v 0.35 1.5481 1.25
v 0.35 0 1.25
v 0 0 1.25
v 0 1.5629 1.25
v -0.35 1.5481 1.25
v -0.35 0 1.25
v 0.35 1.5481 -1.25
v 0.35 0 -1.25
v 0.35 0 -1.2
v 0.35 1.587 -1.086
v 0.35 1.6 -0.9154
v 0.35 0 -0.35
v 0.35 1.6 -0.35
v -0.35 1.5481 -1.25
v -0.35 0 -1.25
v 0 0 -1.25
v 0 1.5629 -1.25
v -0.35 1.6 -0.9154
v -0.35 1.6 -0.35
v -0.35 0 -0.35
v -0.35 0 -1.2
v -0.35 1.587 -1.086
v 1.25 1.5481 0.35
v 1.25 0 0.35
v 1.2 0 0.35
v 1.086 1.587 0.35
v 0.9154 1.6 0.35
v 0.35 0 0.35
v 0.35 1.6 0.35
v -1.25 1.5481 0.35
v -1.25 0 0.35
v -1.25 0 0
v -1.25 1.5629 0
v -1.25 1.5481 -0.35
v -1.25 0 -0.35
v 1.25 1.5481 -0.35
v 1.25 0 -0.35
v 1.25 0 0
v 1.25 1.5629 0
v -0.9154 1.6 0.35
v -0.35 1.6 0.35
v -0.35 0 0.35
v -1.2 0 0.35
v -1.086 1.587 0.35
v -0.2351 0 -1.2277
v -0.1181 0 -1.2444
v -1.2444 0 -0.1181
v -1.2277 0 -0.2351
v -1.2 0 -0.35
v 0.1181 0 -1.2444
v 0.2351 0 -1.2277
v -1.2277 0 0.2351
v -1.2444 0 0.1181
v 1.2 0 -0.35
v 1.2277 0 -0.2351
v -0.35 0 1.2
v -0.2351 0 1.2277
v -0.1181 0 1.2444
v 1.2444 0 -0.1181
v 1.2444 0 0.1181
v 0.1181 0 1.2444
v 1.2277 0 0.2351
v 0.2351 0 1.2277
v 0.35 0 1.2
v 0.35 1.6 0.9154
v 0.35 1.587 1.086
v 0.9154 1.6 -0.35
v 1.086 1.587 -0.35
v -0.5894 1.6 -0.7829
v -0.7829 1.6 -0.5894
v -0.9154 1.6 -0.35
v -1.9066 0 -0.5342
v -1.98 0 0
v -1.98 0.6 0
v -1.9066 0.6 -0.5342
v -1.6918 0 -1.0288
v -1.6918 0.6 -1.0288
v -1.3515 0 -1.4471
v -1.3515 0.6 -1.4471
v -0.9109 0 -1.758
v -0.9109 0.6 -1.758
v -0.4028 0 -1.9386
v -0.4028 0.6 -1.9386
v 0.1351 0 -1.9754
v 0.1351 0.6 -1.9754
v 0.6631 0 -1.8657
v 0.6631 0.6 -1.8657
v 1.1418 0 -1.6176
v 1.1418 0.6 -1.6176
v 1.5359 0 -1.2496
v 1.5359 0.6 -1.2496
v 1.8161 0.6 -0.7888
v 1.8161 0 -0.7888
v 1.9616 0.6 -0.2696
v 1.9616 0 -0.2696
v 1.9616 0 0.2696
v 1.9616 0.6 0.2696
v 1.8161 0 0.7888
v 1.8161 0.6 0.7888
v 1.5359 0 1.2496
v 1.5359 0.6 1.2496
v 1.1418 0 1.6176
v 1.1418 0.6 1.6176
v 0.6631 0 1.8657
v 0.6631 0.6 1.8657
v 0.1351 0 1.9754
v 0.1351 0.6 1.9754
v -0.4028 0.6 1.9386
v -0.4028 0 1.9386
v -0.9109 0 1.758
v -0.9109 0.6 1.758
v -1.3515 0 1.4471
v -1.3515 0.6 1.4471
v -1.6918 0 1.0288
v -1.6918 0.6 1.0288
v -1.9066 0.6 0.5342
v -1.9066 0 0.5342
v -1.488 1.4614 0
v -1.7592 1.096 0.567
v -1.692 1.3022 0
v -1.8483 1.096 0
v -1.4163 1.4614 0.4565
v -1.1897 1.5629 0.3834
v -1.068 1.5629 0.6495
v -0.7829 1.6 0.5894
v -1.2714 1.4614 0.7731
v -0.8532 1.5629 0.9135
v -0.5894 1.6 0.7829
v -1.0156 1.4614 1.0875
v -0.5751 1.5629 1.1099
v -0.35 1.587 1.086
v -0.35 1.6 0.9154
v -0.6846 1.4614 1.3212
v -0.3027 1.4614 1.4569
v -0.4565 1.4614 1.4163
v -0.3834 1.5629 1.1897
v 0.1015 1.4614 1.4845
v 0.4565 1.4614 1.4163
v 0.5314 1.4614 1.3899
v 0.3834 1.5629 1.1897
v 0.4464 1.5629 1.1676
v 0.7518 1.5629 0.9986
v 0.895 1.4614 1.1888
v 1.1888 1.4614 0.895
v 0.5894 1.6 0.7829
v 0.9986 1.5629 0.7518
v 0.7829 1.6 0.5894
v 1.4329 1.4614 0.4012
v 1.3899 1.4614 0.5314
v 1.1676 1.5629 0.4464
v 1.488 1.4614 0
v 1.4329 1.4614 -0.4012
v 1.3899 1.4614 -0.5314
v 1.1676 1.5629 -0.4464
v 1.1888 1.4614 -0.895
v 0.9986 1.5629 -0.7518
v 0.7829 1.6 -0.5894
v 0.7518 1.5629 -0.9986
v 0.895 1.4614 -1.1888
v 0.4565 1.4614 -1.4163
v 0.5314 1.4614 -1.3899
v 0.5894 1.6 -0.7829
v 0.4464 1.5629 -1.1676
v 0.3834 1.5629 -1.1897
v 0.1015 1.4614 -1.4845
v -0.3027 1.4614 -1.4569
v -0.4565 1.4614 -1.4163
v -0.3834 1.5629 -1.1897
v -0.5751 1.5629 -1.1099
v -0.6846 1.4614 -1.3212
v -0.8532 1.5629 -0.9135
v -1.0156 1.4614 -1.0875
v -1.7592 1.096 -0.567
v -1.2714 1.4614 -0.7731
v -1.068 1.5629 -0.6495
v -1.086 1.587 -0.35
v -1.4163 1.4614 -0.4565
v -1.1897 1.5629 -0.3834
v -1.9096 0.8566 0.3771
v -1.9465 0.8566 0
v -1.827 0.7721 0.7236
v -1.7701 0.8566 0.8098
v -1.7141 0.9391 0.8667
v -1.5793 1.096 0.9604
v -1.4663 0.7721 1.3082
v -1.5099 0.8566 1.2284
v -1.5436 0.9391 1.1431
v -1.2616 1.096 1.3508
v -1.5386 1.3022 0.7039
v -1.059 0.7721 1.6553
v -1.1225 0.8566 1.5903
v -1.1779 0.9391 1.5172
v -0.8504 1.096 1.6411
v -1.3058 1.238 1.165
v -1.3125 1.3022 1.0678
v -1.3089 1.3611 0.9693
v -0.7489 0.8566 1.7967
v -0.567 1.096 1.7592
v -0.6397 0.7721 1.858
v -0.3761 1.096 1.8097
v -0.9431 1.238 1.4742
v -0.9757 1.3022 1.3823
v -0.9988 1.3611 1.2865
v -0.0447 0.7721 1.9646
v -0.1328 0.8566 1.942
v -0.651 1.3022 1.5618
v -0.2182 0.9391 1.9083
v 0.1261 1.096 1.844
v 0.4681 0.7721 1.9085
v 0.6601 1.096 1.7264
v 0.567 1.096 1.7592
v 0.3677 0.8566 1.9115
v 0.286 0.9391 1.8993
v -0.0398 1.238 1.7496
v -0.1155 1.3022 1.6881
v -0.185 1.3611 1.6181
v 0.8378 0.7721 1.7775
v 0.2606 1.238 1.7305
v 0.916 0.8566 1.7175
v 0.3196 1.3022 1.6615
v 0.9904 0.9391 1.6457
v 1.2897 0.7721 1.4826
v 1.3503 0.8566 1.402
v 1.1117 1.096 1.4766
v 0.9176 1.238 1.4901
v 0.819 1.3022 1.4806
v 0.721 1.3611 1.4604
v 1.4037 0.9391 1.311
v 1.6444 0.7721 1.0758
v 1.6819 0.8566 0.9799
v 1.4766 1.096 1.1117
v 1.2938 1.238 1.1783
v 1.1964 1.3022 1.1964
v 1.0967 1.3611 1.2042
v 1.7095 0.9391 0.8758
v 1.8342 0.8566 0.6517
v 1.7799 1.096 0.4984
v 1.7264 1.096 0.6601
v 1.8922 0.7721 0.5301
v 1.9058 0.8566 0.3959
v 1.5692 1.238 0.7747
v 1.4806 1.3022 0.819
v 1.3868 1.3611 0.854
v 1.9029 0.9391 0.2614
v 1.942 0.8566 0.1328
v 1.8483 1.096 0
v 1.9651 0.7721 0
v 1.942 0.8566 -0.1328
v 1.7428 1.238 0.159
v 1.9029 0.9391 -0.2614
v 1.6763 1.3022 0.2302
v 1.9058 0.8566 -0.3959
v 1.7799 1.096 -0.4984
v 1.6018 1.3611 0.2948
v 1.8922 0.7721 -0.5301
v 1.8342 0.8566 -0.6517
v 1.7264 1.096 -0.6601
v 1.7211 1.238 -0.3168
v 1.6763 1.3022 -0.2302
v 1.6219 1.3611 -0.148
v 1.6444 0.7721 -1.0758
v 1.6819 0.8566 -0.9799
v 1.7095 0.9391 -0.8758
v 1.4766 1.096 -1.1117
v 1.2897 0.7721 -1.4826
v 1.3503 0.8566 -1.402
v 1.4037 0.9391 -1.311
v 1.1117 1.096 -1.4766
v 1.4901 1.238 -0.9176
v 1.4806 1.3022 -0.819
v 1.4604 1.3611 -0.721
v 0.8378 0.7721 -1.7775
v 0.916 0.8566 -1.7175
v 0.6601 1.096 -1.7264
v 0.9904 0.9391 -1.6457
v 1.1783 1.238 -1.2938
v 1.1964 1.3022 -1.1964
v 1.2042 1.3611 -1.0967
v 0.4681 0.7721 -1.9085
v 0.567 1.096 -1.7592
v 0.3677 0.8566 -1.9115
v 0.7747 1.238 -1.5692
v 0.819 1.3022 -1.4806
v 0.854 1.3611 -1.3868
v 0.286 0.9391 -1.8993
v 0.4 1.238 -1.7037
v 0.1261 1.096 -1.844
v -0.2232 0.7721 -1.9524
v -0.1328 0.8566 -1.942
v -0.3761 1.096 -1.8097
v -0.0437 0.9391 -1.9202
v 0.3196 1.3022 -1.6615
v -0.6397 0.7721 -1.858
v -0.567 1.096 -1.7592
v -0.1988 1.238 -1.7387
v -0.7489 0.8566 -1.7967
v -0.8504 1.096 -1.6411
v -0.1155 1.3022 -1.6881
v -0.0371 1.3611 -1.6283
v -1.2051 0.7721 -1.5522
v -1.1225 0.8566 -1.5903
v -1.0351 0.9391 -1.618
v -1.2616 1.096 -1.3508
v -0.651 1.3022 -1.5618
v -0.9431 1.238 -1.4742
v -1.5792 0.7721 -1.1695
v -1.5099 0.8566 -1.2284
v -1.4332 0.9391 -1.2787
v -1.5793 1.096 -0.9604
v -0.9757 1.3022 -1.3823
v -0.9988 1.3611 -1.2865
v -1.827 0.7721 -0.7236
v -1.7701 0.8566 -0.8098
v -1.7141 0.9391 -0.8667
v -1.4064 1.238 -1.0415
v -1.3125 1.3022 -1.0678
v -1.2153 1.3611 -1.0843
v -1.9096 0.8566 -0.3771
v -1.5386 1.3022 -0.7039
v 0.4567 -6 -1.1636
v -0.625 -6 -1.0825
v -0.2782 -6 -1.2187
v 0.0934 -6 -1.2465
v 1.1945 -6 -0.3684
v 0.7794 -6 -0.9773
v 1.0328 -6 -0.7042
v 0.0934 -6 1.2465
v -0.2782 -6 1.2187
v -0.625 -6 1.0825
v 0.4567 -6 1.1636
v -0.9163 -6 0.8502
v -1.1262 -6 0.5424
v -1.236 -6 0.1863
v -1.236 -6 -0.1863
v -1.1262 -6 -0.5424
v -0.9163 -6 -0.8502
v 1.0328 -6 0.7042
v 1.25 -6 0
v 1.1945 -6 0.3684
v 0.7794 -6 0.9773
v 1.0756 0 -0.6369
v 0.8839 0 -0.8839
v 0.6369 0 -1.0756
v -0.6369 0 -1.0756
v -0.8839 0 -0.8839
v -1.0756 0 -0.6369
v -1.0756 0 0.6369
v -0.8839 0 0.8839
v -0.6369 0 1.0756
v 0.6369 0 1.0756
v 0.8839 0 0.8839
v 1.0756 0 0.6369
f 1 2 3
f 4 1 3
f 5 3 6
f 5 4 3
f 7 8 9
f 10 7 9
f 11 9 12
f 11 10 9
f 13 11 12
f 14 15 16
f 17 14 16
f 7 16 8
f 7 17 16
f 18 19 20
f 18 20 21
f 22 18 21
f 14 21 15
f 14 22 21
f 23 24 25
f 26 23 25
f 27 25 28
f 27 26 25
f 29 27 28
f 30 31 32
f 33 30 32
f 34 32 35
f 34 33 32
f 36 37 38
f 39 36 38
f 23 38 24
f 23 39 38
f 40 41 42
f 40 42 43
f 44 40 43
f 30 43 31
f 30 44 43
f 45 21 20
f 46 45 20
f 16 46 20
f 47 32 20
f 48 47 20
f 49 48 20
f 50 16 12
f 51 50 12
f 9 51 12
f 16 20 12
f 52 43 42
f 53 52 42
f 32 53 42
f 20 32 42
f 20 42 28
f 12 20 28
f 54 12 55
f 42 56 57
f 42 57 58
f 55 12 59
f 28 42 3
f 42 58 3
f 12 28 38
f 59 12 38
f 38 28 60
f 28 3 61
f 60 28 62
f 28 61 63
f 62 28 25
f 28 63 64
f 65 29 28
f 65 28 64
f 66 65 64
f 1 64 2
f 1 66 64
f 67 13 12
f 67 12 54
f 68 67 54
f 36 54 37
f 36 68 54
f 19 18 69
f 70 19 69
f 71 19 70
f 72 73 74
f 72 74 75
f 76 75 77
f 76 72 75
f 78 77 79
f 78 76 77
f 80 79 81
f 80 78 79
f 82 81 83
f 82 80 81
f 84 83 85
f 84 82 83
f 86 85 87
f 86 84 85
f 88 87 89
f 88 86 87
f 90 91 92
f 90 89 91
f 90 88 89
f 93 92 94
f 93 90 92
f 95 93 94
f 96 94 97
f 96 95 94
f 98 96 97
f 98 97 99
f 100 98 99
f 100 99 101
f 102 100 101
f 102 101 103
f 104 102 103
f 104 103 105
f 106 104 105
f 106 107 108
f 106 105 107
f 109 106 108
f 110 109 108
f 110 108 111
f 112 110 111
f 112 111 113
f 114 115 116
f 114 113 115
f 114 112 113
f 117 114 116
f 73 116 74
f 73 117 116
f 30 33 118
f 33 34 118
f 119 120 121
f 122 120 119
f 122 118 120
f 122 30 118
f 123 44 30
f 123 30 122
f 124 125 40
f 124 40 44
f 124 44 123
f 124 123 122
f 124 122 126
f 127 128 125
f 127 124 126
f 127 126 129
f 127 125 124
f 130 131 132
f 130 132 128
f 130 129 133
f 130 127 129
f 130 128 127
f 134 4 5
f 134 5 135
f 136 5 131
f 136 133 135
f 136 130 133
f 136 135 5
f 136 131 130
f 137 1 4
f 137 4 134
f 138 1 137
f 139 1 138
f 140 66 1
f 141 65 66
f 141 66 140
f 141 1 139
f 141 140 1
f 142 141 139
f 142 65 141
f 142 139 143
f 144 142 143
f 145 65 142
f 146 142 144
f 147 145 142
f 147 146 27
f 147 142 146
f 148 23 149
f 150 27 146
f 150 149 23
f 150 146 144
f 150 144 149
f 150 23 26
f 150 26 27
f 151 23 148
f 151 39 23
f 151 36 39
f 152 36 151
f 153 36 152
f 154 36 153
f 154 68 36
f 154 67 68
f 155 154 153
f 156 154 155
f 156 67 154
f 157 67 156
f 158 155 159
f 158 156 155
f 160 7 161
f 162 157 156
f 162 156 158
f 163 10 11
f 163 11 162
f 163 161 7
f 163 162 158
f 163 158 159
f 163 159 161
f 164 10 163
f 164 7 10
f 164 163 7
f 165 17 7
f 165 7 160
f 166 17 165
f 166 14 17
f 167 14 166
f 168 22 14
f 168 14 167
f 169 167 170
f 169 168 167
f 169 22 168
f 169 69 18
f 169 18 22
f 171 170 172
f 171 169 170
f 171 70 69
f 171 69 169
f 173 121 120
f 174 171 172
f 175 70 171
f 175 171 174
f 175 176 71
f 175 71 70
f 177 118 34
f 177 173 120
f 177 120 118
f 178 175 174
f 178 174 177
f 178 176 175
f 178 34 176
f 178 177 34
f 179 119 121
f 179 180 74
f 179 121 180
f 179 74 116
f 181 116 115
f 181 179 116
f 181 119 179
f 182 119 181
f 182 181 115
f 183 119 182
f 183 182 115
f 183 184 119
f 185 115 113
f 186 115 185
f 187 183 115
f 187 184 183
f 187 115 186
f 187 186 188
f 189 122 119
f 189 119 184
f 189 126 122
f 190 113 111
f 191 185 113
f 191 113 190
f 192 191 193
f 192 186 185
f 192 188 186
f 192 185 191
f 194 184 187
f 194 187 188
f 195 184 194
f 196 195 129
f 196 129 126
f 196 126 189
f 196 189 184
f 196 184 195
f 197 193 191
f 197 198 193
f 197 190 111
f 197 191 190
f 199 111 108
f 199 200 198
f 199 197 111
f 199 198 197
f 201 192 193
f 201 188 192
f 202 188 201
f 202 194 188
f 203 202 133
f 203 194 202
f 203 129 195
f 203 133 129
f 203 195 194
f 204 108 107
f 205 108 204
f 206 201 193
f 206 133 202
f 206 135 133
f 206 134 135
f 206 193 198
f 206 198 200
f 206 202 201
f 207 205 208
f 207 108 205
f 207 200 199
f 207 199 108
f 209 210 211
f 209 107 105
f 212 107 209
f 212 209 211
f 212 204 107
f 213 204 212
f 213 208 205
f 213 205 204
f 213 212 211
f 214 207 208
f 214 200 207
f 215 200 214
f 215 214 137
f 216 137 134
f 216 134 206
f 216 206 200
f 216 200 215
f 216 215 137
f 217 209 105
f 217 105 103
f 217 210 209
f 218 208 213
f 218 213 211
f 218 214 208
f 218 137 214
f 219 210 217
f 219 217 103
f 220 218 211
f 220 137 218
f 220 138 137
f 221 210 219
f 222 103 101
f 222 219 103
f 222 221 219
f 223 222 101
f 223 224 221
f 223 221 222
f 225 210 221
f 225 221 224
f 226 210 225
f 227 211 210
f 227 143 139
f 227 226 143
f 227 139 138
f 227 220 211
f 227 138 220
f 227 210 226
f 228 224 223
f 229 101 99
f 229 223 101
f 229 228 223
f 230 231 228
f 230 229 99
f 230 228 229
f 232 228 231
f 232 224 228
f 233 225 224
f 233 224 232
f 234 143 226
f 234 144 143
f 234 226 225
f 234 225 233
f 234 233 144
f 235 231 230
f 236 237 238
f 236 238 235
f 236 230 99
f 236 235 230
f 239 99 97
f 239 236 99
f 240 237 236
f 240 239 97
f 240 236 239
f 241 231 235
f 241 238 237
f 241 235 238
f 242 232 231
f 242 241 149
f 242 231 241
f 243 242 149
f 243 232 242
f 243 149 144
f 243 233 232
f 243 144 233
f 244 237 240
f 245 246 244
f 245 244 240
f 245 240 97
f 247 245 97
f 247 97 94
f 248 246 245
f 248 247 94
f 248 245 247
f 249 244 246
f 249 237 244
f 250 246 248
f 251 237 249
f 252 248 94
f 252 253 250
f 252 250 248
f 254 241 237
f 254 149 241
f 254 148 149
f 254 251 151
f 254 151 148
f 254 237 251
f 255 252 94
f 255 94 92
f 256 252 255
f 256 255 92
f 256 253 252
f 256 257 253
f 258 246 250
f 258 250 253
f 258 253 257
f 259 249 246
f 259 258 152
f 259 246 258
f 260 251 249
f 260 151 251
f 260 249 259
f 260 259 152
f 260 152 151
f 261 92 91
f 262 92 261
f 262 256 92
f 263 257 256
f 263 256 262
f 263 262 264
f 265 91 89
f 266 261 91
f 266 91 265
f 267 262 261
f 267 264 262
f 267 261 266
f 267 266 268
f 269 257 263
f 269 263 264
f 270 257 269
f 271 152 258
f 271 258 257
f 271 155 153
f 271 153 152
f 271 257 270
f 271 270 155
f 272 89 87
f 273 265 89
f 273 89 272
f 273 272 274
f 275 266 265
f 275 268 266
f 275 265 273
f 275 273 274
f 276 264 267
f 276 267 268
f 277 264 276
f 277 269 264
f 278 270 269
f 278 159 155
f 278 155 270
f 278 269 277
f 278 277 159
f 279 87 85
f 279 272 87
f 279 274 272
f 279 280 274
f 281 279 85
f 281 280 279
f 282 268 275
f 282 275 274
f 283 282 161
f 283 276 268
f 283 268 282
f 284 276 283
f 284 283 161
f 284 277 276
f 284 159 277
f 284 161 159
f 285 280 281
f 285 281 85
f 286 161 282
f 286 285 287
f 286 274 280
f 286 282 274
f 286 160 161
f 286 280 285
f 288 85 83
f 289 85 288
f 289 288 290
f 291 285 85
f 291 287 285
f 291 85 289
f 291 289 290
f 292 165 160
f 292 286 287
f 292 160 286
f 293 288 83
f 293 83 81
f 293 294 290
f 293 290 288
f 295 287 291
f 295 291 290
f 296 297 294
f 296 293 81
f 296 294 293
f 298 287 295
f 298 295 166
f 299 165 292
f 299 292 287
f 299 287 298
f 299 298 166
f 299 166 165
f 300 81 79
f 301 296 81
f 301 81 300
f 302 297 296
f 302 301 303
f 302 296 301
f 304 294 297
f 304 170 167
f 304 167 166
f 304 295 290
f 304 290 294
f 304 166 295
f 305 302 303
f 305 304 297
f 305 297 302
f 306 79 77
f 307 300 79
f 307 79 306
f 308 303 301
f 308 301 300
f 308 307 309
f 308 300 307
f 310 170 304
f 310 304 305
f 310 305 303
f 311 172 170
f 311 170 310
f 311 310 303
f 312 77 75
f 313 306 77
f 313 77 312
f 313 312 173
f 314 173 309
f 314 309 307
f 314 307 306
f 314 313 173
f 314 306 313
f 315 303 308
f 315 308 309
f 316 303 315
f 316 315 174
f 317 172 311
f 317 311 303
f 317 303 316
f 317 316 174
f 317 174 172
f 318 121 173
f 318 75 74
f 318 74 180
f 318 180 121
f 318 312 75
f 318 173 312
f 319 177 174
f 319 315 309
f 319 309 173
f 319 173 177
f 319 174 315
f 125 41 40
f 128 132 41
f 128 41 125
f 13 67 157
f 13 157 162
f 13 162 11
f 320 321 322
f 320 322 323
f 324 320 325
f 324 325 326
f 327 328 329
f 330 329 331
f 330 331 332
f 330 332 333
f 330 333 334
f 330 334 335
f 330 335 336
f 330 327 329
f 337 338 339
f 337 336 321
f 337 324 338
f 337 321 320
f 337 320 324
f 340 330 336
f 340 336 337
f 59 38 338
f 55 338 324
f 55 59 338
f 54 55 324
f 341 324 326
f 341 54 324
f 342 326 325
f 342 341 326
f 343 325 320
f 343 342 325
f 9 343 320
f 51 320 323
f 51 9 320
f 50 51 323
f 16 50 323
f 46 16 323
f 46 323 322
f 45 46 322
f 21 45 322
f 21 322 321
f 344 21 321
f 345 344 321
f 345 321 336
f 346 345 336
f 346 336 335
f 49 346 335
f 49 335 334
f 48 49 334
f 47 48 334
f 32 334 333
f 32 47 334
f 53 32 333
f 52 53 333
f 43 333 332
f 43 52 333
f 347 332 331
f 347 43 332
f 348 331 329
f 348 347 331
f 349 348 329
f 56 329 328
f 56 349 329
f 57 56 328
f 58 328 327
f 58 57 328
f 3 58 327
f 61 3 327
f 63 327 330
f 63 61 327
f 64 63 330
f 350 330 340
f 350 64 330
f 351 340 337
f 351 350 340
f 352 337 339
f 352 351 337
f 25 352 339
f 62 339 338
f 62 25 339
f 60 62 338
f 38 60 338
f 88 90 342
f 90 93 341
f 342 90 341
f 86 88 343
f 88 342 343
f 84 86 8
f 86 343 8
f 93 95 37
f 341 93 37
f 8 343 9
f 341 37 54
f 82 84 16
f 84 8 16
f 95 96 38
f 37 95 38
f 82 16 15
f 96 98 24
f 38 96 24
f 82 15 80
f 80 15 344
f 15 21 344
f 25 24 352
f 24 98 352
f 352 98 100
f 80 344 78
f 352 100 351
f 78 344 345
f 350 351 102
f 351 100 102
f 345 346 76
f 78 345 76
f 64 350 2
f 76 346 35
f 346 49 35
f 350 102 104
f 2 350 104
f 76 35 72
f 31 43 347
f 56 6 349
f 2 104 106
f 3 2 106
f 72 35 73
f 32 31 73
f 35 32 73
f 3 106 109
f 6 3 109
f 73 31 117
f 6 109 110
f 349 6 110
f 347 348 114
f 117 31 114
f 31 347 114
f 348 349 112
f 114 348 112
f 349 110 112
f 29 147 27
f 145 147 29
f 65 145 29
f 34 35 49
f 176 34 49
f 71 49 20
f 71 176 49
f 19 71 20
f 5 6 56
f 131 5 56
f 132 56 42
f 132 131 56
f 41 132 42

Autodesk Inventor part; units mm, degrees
ref_plane "YZ Plane" through (0, 0, 0) normal (1, 0, 0) x (0, 1, 0)
ref_plane "XZ Plane" through (0, 0, 0) normal (0, 1, 0) x (-1, 0, 0)
ref_plane "XY Plane" through (0, 0, 0) normal (0, 0, 1) x (1, 0, 0)
sketch "Sketch1" plane through (0, 0, 0) normal (0, 1, 0) x (-1, 0, 0)
  circle A0 centre (0, 0) radius 1.98
  dimension "d0" = 3.96
extrude "Extrusion1" add sketch "Sketch1" along normal blind 1.6
sketch "Sketch2" plane through (0, 1.6, 0) normal (0, 1, 0) x (1, 0, 0)
  line L0 (-0.35, -0.35) -> (-1.25, -0.35)
  line L1 (-1.25, -0.35) -> (-1.25, 0.35)
  line L2 (-1.25, 0.35) -> (-0.35, 0.35)
  line L3 (-0.35, 0.35) -> (-0.35, 1.25)
  line L4 (-0.35, 1.25) -> (0.35, 1.25)
  line L5 (0.35, 1.25) -> (0.35, 0.35)
  line L6 (0.35, 0.35) -> (1.25, 0.35)
  line L7 (1.25, 0.35) -> (1.25, -0.35)
  line L8 (1.25, -0.35) -> (0.35, -0.35)
  line L9 (0.35, -1.25) -> (-0.35, -1.25)
  line L10 (-0.35, -1.25) -> (-0.35, -0.35)
  line L11 (0.35, -0.35) -> (0.35, -1.25)
  point P0 (0, 0)
  point P1 (0, -1.25)
  point P2 (0, 1.25)
  point P3 (-1.25, 0)
  point P4 (1.25, 0)
  dimension "d3" = 2.5
  dimension "d4" = 2.5
  dimension "d5" = 1.25
  dimension "d6" = 1.25
  dimension "d7" = 0.7
  dimension "d8" = 0.7
extrude "Extrusion2" cut sketch "Sketch2" against normal blind 2
fillet "Fillet1" radius 1 1 edges at (1.98, 1.6, 0)
sketch "Sketch3" plane through (0, 0, 0) normal (0, -1, 0) x (1, 0, 0)
  circle A0 centre (0, 0) radius 1.25
  dimension "d12" = 2.5
extrude "Extrusion3" add sketch "Sketch3" along normal blind 6
thread "Thread1" size "M2.5x0.45" class "6g" standard "ANSI Metric M Profile" full length
equation "\"d4\" = d3"
equation "\"d5\" = 0.5 * d4"
equation "\"d6\" = d5"
equation "\"d8\" = d7"
properties part number "M4_8mm" material "Stainless Steel"
